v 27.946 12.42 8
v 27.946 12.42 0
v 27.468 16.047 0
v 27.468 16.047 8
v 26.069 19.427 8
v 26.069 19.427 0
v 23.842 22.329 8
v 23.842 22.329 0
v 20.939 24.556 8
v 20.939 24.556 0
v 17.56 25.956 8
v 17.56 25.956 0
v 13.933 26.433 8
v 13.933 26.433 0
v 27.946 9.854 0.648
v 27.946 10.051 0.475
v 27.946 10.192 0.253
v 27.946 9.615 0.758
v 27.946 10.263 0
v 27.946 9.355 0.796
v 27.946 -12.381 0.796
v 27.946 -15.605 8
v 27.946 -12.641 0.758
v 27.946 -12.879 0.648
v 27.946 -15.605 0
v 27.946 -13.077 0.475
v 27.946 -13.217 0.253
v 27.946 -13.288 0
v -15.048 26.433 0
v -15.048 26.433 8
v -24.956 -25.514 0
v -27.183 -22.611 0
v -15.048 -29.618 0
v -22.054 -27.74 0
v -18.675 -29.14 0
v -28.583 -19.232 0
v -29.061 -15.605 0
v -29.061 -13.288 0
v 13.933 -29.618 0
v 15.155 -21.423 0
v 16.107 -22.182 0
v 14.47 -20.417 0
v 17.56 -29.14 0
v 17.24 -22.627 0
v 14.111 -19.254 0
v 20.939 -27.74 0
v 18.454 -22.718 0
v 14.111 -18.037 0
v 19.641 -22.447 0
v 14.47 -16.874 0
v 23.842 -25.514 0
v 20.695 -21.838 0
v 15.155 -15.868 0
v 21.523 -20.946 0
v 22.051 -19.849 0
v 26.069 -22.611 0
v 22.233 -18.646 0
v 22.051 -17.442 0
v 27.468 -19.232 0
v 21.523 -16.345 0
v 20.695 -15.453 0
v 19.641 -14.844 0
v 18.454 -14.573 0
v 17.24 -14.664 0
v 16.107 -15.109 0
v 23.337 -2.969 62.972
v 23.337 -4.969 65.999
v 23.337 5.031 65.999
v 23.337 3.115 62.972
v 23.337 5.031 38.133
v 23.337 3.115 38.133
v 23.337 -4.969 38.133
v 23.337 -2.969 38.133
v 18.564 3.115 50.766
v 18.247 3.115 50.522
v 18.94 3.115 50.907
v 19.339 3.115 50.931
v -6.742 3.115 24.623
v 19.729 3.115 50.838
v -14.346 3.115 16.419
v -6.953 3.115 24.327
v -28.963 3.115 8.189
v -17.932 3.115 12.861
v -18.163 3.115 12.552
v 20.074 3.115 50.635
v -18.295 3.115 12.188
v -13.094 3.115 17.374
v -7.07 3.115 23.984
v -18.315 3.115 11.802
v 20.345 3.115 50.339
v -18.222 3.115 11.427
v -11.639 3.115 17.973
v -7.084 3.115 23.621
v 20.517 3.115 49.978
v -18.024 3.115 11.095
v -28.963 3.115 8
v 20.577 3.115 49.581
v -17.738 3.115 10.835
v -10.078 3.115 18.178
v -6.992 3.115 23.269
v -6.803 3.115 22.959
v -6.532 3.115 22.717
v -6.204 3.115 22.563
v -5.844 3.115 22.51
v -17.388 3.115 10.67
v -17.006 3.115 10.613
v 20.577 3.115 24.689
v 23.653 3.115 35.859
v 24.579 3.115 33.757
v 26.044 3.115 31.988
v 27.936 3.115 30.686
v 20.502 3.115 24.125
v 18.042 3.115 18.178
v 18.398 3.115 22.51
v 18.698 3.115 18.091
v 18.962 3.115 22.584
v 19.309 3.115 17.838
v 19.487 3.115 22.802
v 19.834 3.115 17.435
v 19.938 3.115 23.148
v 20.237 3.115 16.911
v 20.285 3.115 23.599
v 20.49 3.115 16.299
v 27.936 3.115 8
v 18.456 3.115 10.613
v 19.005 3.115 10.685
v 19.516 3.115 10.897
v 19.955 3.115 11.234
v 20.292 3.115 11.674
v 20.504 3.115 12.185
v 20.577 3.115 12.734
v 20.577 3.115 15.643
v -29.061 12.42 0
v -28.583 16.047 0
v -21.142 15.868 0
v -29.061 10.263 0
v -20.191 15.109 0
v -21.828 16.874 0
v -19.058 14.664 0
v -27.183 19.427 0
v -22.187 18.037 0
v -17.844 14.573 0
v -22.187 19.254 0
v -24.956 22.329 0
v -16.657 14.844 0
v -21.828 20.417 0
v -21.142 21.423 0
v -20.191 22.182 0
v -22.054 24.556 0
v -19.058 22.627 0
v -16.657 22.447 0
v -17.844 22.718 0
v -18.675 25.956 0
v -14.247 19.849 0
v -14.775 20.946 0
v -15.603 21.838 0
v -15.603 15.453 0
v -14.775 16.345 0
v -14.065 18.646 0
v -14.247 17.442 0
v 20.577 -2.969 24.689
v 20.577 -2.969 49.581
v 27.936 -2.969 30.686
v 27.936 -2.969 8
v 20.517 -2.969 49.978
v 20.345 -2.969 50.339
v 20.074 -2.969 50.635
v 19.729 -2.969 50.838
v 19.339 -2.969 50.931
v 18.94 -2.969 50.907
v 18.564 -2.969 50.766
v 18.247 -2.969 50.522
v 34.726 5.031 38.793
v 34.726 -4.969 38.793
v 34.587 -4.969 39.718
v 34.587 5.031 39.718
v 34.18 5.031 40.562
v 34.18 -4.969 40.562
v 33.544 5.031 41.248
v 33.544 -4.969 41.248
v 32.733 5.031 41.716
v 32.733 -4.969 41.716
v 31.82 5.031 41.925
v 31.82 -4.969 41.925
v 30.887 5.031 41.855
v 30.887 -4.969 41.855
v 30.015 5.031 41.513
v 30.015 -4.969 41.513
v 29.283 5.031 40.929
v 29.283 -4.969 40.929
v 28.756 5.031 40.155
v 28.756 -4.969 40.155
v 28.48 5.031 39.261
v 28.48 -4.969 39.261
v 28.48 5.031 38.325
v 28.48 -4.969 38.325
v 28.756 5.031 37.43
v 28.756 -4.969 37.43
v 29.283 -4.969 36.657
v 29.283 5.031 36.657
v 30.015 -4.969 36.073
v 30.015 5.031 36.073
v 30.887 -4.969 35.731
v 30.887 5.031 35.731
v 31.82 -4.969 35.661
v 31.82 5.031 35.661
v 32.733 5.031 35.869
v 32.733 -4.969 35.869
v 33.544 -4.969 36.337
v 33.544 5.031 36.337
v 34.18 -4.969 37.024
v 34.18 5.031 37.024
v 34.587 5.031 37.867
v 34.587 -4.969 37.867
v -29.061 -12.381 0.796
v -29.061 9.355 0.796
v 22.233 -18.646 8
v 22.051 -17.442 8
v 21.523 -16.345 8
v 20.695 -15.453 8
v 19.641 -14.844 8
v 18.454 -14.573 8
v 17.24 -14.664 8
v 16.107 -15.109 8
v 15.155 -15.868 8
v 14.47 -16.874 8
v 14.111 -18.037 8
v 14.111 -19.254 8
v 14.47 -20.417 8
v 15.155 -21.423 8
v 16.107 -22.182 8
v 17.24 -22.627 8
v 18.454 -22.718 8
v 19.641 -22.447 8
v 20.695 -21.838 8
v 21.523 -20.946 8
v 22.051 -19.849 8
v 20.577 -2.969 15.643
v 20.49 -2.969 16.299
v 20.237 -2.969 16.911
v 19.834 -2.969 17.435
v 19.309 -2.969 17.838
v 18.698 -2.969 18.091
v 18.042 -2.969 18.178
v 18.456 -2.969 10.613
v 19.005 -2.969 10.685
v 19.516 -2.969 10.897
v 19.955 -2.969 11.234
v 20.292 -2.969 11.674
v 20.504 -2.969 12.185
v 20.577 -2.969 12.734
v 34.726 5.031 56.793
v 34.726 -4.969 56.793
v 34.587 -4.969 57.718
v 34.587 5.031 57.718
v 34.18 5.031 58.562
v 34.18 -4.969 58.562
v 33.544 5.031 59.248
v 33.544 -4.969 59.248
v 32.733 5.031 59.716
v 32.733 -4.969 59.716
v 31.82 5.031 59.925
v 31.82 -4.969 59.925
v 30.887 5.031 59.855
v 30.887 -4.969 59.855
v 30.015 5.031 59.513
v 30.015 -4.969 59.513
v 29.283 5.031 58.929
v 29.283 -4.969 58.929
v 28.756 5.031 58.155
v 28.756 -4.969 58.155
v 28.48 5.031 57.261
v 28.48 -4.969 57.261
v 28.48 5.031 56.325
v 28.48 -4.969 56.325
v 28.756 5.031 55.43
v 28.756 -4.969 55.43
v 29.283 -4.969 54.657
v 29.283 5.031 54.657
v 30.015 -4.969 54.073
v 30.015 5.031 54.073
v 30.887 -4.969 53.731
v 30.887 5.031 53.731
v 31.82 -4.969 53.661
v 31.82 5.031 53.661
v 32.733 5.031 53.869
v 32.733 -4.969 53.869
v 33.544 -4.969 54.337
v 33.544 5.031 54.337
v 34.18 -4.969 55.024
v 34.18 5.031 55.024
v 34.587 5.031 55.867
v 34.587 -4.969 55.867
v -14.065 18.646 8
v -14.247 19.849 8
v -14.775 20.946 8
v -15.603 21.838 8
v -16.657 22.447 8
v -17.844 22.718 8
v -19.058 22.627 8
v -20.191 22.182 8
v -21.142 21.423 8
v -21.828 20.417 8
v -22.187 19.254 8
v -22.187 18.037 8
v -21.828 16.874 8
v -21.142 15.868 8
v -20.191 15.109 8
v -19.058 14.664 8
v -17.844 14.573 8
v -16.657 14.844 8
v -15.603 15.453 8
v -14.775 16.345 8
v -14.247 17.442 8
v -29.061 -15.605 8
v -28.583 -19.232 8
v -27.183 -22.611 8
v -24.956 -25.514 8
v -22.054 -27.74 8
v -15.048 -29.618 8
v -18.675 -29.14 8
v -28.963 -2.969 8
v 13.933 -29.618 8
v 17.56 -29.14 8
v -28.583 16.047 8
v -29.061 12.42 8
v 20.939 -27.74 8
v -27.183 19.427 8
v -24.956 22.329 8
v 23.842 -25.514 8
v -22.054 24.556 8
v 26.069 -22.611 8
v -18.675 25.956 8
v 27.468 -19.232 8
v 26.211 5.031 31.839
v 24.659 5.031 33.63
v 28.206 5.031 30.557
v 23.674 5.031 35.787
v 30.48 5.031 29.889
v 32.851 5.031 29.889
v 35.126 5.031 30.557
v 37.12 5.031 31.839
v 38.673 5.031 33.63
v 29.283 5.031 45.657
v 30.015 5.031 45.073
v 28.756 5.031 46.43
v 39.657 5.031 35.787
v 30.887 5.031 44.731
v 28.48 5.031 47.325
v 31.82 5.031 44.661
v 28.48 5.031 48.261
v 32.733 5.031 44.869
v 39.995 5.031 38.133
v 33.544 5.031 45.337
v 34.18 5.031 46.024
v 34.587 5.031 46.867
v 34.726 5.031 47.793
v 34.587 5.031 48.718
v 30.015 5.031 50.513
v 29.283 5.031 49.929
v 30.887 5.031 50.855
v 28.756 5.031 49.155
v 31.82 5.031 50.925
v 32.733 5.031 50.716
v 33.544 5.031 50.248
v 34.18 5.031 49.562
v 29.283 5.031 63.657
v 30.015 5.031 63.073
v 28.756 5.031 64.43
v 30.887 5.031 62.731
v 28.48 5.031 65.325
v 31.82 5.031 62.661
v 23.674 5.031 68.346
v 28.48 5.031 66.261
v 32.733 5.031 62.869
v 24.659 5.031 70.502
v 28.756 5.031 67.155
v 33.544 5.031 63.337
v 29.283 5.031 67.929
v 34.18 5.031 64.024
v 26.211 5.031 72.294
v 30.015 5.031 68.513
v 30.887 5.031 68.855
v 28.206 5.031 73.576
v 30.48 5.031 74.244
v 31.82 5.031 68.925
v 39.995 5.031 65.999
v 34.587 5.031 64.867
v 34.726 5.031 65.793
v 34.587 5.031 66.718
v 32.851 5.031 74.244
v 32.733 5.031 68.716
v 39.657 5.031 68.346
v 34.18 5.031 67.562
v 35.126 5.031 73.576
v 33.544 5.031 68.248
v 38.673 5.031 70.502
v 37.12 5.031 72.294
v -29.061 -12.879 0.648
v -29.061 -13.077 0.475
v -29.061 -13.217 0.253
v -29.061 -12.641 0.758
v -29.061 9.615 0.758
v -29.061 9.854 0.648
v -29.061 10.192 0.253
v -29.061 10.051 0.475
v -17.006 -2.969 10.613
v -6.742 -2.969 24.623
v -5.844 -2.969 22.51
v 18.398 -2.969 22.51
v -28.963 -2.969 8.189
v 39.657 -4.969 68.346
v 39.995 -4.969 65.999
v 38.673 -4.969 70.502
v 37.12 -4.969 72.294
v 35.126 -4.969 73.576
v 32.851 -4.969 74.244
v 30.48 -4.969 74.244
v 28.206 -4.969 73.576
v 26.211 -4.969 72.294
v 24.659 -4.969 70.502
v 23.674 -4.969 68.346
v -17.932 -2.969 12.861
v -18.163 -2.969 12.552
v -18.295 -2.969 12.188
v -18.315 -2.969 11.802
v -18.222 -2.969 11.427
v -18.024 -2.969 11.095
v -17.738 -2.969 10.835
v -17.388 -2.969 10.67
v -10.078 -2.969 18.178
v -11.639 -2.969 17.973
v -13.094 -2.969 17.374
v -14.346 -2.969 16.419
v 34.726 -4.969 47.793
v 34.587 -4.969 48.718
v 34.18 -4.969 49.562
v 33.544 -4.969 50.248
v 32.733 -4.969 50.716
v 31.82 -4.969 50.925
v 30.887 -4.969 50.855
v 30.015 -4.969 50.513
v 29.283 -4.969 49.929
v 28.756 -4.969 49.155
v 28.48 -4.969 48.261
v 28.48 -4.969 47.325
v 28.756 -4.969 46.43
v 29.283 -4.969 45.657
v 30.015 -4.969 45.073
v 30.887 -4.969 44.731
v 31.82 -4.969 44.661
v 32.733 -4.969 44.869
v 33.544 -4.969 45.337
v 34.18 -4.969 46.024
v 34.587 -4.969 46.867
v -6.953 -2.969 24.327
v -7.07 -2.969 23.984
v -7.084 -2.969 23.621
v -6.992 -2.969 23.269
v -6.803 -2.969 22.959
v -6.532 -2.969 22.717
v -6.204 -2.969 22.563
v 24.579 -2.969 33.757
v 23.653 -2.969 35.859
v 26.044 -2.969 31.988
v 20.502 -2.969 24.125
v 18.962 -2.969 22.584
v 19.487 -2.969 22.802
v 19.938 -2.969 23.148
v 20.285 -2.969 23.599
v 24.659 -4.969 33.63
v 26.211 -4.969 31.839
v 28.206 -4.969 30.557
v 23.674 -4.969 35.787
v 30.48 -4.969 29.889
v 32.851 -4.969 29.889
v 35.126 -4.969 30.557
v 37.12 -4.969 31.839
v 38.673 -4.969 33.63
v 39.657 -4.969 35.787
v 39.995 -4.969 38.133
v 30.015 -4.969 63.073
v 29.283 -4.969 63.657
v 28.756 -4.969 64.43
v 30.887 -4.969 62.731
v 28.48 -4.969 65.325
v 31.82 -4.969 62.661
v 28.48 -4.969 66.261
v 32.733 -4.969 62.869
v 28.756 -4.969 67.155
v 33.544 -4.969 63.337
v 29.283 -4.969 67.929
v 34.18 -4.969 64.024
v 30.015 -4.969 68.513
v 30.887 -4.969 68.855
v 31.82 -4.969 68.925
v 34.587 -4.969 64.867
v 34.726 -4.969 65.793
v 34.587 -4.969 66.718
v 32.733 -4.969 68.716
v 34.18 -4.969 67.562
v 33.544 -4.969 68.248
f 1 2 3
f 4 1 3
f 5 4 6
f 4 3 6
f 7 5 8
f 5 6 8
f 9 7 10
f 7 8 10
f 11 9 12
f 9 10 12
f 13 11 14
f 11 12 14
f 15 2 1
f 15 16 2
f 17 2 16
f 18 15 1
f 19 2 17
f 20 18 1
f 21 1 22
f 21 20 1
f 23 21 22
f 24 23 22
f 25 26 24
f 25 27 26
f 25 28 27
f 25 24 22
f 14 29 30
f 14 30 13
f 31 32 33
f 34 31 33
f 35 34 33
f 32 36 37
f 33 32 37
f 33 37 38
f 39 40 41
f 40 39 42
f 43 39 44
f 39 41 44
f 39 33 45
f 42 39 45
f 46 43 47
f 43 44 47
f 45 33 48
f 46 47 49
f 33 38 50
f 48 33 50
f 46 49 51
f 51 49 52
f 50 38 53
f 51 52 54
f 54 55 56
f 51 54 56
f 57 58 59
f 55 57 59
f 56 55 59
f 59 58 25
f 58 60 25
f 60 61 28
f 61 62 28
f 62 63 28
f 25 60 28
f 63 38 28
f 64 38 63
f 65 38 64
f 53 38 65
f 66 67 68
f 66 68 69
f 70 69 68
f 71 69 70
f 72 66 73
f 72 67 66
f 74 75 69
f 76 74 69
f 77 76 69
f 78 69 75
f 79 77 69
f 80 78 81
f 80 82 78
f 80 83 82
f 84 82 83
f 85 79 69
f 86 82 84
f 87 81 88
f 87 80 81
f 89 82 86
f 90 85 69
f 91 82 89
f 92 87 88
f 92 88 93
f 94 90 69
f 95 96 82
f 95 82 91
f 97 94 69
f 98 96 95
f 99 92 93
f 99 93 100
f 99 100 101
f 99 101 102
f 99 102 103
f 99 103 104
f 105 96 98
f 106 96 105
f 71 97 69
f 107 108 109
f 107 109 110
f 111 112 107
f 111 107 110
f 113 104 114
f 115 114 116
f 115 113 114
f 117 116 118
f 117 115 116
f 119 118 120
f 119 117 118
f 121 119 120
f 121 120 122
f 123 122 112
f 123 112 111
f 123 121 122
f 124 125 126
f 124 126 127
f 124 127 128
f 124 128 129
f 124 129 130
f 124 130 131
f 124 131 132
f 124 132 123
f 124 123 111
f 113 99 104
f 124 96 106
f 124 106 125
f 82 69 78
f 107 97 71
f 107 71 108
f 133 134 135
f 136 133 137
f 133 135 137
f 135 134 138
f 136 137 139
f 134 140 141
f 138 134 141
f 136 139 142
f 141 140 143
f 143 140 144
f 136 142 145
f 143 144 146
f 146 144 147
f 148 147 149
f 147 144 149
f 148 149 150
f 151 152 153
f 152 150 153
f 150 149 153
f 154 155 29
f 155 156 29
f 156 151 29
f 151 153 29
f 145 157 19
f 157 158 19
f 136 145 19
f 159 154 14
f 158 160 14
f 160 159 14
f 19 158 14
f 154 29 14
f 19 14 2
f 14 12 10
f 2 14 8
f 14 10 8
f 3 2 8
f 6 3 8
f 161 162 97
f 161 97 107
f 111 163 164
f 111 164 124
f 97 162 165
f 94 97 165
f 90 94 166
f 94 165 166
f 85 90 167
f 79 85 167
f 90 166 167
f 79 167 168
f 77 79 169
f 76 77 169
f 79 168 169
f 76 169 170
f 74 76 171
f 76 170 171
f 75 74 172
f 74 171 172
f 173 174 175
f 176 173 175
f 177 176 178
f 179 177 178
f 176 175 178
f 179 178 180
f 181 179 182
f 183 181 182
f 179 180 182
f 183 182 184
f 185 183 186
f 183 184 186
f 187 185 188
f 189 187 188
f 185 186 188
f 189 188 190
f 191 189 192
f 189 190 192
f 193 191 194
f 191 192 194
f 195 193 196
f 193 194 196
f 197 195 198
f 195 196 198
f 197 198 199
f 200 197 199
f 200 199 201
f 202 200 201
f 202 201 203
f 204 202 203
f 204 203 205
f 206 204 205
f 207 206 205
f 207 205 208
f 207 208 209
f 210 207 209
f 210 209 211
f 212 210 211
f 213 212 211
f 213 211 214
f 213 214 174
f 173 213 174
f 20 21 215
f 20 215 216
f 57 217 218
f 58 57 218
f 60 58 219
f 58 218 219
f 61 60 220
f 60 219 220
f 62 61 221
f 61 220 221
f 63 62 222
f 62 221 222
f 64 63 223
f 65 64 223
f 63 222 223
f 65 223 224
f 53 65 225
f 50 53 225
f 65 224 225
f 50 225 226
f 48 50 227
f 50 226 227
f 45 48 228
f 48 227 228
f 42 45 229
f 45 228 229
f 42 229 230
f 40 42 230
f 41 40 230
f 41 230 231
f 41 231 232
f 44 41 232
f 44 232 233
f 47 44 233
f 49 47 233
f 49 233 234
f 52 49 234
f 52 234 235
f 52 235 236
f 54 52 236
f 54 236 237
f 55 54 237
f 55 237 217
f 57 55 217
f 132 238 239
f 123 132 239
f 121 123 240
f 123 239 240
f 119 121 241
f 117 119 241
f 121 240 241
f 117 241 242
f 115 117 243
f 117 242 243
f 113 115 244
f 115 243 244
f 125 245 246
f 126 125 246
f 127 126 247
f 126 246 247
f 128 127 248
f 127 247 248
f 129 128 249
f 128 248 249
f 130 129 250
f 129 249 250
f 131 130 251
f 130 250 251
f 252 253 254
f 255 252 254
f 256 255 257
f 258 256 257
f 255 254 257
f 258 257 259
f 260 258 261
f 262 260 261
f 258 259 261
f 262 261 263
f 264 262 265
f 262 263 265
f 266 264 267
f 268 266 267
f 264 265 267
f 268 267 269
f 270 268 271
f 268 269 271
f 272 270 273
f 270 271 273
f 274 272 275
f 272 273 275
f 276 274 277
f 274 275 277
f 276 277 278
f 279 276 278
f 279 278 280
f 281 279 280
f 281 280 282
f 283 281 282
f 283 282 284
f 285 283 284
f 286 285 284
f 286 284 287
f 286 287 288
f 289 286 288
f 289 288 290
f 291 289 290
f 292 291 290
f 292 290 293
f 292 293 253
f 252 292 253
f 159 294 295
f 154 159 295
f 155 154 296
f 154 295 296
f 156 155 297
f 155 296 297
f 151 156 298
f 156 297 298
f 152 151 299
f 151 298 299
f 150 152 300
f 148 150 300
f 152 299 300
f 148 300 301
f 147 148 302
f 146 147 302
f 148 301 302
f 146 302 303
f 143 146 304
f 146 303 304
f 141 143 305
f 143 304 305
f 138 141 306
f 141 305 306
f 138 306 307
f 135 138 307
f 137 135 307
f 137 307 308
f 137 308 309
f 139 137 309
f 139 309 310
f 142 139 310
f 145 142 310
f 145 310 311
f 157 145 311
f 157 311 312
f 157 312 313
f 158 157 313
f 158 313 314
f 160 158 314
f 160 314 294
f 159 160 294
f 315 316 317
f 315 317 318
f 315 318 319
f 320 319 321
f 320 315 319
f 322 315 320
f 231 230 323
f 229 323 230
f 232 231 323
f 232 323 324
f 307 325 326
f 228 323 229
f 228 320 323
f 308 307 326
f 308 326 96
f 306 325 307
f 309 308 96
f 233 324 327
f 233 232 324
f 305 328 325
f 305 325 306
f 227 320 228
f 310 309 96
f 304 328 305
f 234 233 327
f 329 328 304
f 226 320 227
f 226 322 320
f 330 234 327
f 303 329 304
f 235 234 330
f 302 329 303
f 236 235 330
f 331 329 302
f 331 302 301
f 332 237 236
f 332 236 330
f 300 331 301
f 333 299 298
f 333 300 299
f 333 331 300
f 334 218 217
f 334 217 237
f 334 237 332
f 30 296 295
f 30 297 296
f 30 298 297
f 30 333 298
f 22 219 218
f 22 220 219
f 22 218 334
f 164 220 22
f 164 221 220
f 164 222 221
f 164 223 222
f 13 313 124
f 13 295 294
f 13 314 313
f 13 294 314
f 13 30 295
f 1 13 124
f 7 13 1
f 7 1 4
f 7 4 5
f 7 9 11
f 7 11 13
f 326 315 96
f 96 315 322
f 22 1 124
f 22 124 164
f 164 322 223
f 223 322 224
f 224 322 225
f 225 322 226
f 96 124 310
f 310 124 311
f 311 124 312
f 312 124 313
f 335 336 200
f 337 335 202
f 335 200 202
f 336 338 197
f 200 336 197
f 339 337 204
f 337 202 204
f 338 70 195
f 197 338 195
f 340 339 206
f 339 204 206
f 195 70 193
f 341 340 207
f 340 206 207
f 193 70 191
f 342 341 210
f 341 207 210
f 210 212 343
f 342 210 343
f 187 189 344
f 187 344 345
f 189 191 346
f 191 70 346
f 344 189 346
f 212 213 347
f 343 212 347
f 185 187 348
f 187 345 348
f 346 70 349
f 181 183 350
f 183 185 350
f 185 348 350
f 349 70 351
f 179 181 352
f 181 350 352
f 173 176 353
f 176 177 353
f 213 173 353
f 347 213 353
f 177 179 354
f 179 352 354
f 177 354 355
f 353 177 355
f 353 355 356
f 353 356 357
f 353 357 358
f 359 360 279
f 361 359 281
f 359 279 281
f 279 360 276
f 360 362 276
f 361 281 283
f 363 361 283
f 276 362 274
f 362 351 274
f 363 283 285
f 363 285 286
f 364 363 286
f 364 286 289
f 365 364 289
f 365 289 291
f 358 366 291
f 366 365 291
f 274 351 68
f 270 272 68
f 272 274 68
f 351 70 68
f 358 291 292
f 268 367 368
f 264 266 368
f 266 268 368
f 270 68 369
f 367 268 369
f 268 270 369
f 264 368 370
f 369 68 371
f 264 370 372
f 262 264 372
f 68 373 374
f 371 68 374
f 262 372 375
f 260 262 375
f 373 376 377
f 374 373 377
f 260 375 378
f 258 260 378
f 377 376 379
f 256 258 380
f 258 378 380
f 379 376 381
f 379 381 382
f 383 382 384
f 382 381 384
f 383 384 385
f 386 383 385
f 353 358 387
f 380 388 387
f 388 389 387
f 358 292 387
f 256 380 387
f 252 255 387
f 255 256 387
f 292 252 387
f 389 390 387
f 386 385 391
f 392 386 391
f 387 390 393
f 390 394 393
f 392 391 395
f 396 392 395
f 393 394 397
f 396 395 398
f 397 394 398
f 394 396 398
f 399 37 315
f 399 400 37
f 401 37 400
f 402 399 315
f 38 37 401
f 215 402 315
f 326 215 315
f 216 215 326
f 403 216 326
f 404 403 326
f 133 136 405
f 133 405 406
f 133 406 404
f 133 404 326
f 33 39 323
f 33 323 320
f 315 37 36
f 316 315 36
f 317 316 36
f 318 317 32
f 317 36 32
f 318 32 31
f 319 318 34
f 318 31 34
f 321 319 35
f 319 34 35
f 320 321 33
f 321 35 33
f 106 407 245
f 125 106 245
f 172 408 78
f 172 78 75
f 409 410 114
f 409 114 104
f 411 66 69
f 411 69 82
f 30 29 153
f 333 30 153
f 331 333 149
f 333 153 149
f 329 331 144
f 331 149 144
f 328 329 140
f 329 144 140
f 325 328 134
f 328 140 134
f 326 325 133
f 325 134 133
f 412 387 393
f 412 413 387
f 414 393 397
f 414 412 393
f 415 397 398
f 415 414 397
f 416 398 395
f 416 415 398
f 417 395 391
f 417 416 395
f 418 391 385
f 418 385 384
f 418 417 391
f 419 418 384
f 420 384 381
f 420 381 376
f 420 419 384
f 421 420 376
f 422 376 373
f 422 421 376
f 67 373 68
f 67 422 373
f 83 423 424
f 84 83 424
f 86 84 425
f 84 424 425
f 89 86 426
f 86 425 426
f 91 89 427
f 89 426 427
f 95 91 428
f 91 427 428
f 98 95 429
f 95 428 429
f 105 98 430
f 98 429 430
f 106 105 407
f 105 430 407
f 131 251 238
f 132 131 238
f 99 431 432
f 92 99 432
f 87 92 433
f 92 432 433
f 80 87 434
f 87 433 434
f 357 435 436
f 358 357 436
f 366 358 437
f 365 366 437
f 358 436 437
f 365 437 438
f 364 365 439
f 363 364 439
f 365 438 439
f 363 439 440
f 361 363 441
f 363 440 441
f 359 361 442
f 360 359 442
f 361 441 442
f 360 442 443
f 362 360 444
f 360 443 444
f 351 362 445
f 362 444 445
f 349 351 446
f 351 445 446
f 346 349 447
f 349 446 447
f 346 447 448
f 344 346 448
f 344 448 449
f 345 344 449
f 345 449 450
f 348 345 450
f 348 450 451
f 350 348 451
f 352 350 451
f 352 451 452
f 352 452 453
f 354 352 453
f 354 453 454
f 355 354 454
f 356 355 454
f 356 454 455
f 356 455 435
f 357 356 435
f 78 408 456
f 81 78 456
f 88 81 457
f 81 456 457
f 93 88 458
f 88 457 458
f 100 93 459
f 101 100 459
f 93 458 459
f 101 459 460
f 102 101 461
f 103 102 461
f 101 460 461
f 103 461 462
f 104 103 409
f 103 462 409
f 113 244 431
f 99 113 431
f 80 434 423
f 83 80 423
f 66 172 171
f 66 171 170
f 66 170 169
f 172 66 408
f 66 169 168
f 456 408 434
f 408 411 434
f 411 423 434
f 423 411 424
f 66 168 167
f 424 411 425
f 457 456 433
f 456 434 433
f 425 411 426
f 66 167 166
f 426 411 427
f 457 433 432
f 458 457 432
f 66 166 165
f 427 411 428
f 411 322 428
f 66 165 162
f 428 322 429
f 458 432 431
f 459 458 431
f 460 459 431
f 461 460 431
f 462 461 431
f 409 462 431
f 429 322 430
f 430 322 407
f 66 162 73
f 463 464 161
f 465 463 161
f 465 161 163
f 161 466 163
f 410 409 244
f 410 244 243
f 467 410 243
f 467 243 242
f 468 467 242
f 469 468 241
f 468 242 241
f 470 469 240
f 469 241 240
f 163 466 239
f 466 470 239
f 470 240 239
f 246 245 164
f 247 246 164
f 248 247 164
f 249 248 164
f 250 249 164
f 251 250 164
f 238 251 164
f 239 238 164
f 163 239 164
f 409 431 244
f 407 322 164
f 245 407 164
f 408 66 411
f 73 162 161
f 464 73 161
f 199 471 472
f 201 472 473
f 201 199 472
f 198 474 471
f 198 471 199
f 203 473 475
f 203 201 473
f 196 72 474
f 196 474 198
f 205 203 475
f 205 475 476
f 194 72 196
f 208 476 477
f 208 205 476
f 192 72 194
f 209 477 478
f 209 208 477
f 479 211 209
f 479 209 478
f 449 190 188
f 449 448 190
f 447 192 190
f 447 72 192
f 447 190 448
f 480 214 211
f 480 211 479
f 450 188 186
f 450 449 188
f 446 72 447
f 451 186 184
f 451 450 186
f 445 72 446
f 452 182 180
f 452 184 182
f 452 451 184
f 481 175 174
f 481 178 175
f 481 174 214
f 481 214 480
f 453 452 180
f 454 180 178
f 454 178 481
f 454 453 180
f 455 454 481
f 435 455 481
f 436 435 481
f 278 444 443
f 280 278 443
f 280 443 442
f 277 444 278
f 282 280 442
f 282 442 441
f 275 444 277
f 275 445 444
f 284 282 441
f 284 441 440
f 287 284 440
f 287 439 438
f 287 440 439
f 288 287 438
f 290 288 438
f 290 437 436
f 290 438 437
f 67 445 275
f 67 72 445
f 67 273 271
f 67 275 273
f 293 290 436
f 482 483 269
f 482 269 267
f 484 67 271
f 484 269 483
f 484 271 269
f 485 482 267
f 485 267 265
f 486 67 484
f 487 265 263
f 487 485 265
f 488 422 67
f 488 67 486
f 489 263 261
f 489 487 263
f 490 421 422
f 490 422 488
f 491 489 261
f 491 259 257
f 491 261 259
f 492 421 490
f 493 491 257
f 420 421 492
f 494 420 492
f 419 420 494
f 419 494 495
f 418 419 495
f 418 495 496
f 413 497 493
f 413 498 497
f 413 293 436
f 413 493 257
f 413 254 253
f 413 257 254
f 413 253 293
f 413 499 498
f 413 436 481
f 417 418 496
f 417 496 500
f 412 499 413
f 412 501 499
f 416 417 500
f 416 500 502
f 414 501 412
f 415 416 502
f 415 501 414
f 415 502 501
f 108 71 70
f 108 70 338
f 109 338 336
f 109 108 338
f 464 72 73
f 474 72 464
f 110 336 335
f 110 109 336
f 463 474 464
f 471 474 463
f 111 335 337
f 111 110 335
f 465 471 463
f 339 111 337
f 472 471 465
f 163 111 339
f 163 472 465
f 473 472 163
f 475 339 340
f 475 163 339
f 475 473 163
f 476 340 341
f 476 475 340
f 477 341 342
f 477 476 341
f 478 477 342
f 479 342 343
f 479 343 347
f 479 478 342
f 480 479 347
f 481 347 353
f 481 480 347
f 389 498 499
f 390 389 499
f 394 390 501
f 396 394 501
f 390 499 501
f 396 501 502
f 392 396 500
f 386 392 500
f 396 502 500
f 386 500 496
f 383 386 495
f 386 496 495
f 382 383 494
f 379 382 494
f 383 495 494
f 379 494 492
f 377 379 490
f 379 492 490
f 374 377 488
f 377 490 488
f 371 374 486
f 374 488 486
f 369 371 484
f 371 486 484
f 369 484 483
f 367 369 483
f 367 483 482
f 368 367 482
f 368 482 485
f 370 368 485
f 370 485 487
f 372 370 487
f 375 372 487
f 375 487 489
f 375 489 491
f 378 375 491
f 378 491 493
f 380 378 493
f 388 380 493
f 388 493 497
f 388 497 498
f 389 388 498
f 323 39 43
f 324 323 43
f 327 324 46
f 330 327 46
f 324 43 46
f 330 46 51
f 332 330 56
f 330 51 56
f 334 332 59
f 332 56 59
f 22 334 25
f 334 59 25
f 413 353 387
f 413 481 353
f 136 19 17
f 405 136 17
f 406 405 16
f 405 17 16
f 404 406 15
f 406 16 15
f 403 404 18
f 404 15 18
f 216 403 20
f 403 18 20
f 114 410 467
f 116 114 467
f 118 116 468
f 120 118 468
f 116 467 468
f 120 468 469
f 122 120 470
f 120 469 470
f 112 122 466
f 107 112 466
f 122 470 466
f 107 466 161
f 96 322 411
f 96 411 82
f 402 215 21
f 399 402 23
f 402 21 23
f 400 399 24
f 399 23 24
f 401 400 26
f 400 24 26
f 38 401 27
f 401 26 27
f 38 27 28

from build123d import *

# Parameters (mm, degrees)
PAD_DEPTH       = 8
POCKET_DEPTH    = 57.0073705793
SKETCH002_R     = 4.0836886852
POCKET001_DEPTH = 8.001
SKETCH003_W     = 56.899337
SKETCH003_H     = 6.084113
PAD001_DEPTH    = 60
POCKET002_DEPTH = 29.4027415793
POCKET003_DEPTH = 29.4027415793
PAD002_DEPTH    = 5
SKETCH007_R     = 3.14062
POCKET004_DEPTH = 31.4027415793


with BuildPart() as part:
    # Sketch → Pad (new body)
    with BuildSketch(Plane.XY):
        with BuildLine():
            ThreePointArc((-15.0477684207, 26.4331275793), (-24.9562751358, 22.3288897151), (-29.060513, 12.420383))
            Line((-29.060513, -15.6050894207), (-29.060513, 12.420383))
            ThreePointArc((-29.060513, -15.6050894207), (-24.9562751358, -25.5135961358), (-15.0477684207, -29.617834))
            Line((13.933113, -29.617834), (-15.0477684207, -29.617834))
            ThreePointArc((13.933113, -29.617834), (23.841619715, -25.5135961358), (27.9458575793, -15.6050894207))
            Line((27.9458575793, 12.420383), (27.9458575793, -15.6050894207))
            ThreePointArc((27.9458575793, 12.420383), (23.8416197151, 22.3288897151), (13.933113, 26.4331275793))
            Line((-15.0477684207, 26.4331275793), (13.933113, 26.4331275793))
        make_face()
    extrude(amount=PAD_DEPTH)

    # Sketch001 (on Face6 of Pad) → Pocket (cut, through all)
    with BuildSketch(Plane.YZ.offset(27.9458575793)):
        with BuildLine():
            ThreePointArc((-12.380569, 0.7961803172), (-13.0279997287, 0.5280057287), (-13.2961743172, -0.119425))
            Line((-13.2961743172, -1.9506356828), (-13.2961743172, -0.119425))
            ThreePointArc((-13.2961743172, -1.9506356828), (-13.0279997287, -2.5980664115), (-12.380569, -2.866241))
            Line((9.355097, -2.866241), (-12.380569, -2.866241))
            ThreePointArc((9.355097, -2.866241), (10.0025277287, -2.5980664115), (10.2707023172, -1.9506356828))
            Line((10.2707023172, -0.119425), (10.2707023172, -1.9506356828))
            ThreePointArc((10.2707023172, -0.119425), (10.0025277287, 0.5280057287), (9.355097, 0.7961803172))
            Line((-12.380569, 0.7961803172), (9.355097, 0.7961803172))
        make_face()
    extrude(amount=-POCKET_DEPTH, mode=Mode.SUBTRACT)

    # Sketch002 (on Face5 of Pocket) → Pocket001 (cut, through all)
    with BuildSketch(Plane.XY.offset(8)):
        with Locations((-18.148907, 18.645535)):
            Circle(SKETCH002_R)
        with Locations((18.148907, -18.645535)):
            Circle(SKETCH002_R)
    extrude(amount=-POCKET001_DEPTH, mode=Mode.SUBTRACT)

    # Sketch003 (on Face5 of Pocket001) → Pad001 (join)
    with BuildSketch(Plane.XY.offset(8)):
        with Locations((-0.5137005, 0.0734425)):
            Rectangle(SKETCH003_W, SKETCH003_H)
    extrude(amount=PAD001_DEPTH)

    # Sketch004 (on Face18 of Pad001) → Pocket002 (cut, through all)
    with BuildSketch(Plane.XZ.offset(2.968614)):
        Polygon((32.25227, 72.310852), (-33.045937, 3.912876), (-33.045937, 72.310852), align=None)
    extrude(amount=-POCKET002_DEPTH, mode=Mode.SUBTRACT)

    # Sketch005 (on Face18 of Pocket002) → Pocket003 (cut, through all)
    with BuildSketch(Plane.XZ.offset(2.968614)):
        with BuildLine():
            Line((20.576633, 49.5814919899), (20.576633, 24.688993))
            ThreePointArc((18.39756, 22.50992), (19.938397295, 23.148155705), (20.576633, 24.688993))
            Line((18.39756, 22.50992), (-5.8443663857, 22.50992))
            ThreePointArc((-6.7417037948, 24.6225852162), (-6.992034537, 23.2693582646), (-5.8443663857, 22.50992))
            Line((-6.7417037948, 24.6225852162), (18.2466667899, 50.5222462275))
            ThreePointArc((20.576633, 49.5814919899), (19.7290007026, 50.837851918), (18.2466667899, 50.5222462275))
        make_face()
        with BuildLine():
            Line((-14.3464422841, 16.4193365685), (-17.9321506281, 12.8610900081))
            ThreePointArc((-17.9321506281, 12.8610900081), (-18.2216862616, 11.4271148765), (-17.0060998632, 10.6131951821))
            Line((-17.0060998632, 10.6131951821), (18.45566, 10.6131951821))
            ThreePointArc((18.45566, 10.6131951821), (19.955414391, 11.234413791), (20.576633, 12.7341681821))
            Line((20.576633, 12.7341681821), (20.576633, 15.643153))
            ThreePointArc((20.576633, 15.643153), (19.8342365583, 17.4354565583), (18.041933, 18.177853))
            Line((18.041933, 18.177853), (-10.0778210188, 18.177853))
            ThreePointArc((-10.0778210188, 18.177853), (-12.3861487439, 17.7210037241), (-14.3464422841, 16.4193365685))
        make_face()
    extrude(amount=-POCKET003_DEPTH, mode=Mode.SUBTRACT)

    # Sketch006 (on Face18 of Pocket003) → Pad002 (join, symmetric)
    with BuildSketch(Plane.XZ.offset(-0.031386)):
        with BuildLine():
            ThreePointArc((39.9948353179, 65.999481), (31.665817, 74.3284993179), (23.3367986821, 65.999481))
            Line((23.3367986821, 65.999481), (23.3367986821, 38.133236))
            ThreePointArc((23.3367986821, 38.133236), (31.665817, 29.8042176821), (39.9948353179, 38.133236))
            Line((39.9948353179, 38.133236), (39.9948353179, 65.999481))
        make_face()
    extrude(amount=PAD002_DEPTH, both=True)

    # Sketch007 (on Face39 of Pad002) → Pocket004 (cut, through all)
    with BuildSketch(Plane.XZ.offset(4.968614)):
        with Locations((31.585516, 65.792679)):
            Circle(SKETCH007_R)
        with Locations((31.585516, 56.792679)):
            Circle(SKETCH007_R)
        with Locations((31.585516, 47.792679)):
            Circle(SKETCH007_R)
        with Locations((31.585516, 38.792679)):
            Circle(SKETCH007_R)
    extrude(amount=-POCKET004_DEPTH, mode=Mode.SUBTRACT)


solid = part.part
